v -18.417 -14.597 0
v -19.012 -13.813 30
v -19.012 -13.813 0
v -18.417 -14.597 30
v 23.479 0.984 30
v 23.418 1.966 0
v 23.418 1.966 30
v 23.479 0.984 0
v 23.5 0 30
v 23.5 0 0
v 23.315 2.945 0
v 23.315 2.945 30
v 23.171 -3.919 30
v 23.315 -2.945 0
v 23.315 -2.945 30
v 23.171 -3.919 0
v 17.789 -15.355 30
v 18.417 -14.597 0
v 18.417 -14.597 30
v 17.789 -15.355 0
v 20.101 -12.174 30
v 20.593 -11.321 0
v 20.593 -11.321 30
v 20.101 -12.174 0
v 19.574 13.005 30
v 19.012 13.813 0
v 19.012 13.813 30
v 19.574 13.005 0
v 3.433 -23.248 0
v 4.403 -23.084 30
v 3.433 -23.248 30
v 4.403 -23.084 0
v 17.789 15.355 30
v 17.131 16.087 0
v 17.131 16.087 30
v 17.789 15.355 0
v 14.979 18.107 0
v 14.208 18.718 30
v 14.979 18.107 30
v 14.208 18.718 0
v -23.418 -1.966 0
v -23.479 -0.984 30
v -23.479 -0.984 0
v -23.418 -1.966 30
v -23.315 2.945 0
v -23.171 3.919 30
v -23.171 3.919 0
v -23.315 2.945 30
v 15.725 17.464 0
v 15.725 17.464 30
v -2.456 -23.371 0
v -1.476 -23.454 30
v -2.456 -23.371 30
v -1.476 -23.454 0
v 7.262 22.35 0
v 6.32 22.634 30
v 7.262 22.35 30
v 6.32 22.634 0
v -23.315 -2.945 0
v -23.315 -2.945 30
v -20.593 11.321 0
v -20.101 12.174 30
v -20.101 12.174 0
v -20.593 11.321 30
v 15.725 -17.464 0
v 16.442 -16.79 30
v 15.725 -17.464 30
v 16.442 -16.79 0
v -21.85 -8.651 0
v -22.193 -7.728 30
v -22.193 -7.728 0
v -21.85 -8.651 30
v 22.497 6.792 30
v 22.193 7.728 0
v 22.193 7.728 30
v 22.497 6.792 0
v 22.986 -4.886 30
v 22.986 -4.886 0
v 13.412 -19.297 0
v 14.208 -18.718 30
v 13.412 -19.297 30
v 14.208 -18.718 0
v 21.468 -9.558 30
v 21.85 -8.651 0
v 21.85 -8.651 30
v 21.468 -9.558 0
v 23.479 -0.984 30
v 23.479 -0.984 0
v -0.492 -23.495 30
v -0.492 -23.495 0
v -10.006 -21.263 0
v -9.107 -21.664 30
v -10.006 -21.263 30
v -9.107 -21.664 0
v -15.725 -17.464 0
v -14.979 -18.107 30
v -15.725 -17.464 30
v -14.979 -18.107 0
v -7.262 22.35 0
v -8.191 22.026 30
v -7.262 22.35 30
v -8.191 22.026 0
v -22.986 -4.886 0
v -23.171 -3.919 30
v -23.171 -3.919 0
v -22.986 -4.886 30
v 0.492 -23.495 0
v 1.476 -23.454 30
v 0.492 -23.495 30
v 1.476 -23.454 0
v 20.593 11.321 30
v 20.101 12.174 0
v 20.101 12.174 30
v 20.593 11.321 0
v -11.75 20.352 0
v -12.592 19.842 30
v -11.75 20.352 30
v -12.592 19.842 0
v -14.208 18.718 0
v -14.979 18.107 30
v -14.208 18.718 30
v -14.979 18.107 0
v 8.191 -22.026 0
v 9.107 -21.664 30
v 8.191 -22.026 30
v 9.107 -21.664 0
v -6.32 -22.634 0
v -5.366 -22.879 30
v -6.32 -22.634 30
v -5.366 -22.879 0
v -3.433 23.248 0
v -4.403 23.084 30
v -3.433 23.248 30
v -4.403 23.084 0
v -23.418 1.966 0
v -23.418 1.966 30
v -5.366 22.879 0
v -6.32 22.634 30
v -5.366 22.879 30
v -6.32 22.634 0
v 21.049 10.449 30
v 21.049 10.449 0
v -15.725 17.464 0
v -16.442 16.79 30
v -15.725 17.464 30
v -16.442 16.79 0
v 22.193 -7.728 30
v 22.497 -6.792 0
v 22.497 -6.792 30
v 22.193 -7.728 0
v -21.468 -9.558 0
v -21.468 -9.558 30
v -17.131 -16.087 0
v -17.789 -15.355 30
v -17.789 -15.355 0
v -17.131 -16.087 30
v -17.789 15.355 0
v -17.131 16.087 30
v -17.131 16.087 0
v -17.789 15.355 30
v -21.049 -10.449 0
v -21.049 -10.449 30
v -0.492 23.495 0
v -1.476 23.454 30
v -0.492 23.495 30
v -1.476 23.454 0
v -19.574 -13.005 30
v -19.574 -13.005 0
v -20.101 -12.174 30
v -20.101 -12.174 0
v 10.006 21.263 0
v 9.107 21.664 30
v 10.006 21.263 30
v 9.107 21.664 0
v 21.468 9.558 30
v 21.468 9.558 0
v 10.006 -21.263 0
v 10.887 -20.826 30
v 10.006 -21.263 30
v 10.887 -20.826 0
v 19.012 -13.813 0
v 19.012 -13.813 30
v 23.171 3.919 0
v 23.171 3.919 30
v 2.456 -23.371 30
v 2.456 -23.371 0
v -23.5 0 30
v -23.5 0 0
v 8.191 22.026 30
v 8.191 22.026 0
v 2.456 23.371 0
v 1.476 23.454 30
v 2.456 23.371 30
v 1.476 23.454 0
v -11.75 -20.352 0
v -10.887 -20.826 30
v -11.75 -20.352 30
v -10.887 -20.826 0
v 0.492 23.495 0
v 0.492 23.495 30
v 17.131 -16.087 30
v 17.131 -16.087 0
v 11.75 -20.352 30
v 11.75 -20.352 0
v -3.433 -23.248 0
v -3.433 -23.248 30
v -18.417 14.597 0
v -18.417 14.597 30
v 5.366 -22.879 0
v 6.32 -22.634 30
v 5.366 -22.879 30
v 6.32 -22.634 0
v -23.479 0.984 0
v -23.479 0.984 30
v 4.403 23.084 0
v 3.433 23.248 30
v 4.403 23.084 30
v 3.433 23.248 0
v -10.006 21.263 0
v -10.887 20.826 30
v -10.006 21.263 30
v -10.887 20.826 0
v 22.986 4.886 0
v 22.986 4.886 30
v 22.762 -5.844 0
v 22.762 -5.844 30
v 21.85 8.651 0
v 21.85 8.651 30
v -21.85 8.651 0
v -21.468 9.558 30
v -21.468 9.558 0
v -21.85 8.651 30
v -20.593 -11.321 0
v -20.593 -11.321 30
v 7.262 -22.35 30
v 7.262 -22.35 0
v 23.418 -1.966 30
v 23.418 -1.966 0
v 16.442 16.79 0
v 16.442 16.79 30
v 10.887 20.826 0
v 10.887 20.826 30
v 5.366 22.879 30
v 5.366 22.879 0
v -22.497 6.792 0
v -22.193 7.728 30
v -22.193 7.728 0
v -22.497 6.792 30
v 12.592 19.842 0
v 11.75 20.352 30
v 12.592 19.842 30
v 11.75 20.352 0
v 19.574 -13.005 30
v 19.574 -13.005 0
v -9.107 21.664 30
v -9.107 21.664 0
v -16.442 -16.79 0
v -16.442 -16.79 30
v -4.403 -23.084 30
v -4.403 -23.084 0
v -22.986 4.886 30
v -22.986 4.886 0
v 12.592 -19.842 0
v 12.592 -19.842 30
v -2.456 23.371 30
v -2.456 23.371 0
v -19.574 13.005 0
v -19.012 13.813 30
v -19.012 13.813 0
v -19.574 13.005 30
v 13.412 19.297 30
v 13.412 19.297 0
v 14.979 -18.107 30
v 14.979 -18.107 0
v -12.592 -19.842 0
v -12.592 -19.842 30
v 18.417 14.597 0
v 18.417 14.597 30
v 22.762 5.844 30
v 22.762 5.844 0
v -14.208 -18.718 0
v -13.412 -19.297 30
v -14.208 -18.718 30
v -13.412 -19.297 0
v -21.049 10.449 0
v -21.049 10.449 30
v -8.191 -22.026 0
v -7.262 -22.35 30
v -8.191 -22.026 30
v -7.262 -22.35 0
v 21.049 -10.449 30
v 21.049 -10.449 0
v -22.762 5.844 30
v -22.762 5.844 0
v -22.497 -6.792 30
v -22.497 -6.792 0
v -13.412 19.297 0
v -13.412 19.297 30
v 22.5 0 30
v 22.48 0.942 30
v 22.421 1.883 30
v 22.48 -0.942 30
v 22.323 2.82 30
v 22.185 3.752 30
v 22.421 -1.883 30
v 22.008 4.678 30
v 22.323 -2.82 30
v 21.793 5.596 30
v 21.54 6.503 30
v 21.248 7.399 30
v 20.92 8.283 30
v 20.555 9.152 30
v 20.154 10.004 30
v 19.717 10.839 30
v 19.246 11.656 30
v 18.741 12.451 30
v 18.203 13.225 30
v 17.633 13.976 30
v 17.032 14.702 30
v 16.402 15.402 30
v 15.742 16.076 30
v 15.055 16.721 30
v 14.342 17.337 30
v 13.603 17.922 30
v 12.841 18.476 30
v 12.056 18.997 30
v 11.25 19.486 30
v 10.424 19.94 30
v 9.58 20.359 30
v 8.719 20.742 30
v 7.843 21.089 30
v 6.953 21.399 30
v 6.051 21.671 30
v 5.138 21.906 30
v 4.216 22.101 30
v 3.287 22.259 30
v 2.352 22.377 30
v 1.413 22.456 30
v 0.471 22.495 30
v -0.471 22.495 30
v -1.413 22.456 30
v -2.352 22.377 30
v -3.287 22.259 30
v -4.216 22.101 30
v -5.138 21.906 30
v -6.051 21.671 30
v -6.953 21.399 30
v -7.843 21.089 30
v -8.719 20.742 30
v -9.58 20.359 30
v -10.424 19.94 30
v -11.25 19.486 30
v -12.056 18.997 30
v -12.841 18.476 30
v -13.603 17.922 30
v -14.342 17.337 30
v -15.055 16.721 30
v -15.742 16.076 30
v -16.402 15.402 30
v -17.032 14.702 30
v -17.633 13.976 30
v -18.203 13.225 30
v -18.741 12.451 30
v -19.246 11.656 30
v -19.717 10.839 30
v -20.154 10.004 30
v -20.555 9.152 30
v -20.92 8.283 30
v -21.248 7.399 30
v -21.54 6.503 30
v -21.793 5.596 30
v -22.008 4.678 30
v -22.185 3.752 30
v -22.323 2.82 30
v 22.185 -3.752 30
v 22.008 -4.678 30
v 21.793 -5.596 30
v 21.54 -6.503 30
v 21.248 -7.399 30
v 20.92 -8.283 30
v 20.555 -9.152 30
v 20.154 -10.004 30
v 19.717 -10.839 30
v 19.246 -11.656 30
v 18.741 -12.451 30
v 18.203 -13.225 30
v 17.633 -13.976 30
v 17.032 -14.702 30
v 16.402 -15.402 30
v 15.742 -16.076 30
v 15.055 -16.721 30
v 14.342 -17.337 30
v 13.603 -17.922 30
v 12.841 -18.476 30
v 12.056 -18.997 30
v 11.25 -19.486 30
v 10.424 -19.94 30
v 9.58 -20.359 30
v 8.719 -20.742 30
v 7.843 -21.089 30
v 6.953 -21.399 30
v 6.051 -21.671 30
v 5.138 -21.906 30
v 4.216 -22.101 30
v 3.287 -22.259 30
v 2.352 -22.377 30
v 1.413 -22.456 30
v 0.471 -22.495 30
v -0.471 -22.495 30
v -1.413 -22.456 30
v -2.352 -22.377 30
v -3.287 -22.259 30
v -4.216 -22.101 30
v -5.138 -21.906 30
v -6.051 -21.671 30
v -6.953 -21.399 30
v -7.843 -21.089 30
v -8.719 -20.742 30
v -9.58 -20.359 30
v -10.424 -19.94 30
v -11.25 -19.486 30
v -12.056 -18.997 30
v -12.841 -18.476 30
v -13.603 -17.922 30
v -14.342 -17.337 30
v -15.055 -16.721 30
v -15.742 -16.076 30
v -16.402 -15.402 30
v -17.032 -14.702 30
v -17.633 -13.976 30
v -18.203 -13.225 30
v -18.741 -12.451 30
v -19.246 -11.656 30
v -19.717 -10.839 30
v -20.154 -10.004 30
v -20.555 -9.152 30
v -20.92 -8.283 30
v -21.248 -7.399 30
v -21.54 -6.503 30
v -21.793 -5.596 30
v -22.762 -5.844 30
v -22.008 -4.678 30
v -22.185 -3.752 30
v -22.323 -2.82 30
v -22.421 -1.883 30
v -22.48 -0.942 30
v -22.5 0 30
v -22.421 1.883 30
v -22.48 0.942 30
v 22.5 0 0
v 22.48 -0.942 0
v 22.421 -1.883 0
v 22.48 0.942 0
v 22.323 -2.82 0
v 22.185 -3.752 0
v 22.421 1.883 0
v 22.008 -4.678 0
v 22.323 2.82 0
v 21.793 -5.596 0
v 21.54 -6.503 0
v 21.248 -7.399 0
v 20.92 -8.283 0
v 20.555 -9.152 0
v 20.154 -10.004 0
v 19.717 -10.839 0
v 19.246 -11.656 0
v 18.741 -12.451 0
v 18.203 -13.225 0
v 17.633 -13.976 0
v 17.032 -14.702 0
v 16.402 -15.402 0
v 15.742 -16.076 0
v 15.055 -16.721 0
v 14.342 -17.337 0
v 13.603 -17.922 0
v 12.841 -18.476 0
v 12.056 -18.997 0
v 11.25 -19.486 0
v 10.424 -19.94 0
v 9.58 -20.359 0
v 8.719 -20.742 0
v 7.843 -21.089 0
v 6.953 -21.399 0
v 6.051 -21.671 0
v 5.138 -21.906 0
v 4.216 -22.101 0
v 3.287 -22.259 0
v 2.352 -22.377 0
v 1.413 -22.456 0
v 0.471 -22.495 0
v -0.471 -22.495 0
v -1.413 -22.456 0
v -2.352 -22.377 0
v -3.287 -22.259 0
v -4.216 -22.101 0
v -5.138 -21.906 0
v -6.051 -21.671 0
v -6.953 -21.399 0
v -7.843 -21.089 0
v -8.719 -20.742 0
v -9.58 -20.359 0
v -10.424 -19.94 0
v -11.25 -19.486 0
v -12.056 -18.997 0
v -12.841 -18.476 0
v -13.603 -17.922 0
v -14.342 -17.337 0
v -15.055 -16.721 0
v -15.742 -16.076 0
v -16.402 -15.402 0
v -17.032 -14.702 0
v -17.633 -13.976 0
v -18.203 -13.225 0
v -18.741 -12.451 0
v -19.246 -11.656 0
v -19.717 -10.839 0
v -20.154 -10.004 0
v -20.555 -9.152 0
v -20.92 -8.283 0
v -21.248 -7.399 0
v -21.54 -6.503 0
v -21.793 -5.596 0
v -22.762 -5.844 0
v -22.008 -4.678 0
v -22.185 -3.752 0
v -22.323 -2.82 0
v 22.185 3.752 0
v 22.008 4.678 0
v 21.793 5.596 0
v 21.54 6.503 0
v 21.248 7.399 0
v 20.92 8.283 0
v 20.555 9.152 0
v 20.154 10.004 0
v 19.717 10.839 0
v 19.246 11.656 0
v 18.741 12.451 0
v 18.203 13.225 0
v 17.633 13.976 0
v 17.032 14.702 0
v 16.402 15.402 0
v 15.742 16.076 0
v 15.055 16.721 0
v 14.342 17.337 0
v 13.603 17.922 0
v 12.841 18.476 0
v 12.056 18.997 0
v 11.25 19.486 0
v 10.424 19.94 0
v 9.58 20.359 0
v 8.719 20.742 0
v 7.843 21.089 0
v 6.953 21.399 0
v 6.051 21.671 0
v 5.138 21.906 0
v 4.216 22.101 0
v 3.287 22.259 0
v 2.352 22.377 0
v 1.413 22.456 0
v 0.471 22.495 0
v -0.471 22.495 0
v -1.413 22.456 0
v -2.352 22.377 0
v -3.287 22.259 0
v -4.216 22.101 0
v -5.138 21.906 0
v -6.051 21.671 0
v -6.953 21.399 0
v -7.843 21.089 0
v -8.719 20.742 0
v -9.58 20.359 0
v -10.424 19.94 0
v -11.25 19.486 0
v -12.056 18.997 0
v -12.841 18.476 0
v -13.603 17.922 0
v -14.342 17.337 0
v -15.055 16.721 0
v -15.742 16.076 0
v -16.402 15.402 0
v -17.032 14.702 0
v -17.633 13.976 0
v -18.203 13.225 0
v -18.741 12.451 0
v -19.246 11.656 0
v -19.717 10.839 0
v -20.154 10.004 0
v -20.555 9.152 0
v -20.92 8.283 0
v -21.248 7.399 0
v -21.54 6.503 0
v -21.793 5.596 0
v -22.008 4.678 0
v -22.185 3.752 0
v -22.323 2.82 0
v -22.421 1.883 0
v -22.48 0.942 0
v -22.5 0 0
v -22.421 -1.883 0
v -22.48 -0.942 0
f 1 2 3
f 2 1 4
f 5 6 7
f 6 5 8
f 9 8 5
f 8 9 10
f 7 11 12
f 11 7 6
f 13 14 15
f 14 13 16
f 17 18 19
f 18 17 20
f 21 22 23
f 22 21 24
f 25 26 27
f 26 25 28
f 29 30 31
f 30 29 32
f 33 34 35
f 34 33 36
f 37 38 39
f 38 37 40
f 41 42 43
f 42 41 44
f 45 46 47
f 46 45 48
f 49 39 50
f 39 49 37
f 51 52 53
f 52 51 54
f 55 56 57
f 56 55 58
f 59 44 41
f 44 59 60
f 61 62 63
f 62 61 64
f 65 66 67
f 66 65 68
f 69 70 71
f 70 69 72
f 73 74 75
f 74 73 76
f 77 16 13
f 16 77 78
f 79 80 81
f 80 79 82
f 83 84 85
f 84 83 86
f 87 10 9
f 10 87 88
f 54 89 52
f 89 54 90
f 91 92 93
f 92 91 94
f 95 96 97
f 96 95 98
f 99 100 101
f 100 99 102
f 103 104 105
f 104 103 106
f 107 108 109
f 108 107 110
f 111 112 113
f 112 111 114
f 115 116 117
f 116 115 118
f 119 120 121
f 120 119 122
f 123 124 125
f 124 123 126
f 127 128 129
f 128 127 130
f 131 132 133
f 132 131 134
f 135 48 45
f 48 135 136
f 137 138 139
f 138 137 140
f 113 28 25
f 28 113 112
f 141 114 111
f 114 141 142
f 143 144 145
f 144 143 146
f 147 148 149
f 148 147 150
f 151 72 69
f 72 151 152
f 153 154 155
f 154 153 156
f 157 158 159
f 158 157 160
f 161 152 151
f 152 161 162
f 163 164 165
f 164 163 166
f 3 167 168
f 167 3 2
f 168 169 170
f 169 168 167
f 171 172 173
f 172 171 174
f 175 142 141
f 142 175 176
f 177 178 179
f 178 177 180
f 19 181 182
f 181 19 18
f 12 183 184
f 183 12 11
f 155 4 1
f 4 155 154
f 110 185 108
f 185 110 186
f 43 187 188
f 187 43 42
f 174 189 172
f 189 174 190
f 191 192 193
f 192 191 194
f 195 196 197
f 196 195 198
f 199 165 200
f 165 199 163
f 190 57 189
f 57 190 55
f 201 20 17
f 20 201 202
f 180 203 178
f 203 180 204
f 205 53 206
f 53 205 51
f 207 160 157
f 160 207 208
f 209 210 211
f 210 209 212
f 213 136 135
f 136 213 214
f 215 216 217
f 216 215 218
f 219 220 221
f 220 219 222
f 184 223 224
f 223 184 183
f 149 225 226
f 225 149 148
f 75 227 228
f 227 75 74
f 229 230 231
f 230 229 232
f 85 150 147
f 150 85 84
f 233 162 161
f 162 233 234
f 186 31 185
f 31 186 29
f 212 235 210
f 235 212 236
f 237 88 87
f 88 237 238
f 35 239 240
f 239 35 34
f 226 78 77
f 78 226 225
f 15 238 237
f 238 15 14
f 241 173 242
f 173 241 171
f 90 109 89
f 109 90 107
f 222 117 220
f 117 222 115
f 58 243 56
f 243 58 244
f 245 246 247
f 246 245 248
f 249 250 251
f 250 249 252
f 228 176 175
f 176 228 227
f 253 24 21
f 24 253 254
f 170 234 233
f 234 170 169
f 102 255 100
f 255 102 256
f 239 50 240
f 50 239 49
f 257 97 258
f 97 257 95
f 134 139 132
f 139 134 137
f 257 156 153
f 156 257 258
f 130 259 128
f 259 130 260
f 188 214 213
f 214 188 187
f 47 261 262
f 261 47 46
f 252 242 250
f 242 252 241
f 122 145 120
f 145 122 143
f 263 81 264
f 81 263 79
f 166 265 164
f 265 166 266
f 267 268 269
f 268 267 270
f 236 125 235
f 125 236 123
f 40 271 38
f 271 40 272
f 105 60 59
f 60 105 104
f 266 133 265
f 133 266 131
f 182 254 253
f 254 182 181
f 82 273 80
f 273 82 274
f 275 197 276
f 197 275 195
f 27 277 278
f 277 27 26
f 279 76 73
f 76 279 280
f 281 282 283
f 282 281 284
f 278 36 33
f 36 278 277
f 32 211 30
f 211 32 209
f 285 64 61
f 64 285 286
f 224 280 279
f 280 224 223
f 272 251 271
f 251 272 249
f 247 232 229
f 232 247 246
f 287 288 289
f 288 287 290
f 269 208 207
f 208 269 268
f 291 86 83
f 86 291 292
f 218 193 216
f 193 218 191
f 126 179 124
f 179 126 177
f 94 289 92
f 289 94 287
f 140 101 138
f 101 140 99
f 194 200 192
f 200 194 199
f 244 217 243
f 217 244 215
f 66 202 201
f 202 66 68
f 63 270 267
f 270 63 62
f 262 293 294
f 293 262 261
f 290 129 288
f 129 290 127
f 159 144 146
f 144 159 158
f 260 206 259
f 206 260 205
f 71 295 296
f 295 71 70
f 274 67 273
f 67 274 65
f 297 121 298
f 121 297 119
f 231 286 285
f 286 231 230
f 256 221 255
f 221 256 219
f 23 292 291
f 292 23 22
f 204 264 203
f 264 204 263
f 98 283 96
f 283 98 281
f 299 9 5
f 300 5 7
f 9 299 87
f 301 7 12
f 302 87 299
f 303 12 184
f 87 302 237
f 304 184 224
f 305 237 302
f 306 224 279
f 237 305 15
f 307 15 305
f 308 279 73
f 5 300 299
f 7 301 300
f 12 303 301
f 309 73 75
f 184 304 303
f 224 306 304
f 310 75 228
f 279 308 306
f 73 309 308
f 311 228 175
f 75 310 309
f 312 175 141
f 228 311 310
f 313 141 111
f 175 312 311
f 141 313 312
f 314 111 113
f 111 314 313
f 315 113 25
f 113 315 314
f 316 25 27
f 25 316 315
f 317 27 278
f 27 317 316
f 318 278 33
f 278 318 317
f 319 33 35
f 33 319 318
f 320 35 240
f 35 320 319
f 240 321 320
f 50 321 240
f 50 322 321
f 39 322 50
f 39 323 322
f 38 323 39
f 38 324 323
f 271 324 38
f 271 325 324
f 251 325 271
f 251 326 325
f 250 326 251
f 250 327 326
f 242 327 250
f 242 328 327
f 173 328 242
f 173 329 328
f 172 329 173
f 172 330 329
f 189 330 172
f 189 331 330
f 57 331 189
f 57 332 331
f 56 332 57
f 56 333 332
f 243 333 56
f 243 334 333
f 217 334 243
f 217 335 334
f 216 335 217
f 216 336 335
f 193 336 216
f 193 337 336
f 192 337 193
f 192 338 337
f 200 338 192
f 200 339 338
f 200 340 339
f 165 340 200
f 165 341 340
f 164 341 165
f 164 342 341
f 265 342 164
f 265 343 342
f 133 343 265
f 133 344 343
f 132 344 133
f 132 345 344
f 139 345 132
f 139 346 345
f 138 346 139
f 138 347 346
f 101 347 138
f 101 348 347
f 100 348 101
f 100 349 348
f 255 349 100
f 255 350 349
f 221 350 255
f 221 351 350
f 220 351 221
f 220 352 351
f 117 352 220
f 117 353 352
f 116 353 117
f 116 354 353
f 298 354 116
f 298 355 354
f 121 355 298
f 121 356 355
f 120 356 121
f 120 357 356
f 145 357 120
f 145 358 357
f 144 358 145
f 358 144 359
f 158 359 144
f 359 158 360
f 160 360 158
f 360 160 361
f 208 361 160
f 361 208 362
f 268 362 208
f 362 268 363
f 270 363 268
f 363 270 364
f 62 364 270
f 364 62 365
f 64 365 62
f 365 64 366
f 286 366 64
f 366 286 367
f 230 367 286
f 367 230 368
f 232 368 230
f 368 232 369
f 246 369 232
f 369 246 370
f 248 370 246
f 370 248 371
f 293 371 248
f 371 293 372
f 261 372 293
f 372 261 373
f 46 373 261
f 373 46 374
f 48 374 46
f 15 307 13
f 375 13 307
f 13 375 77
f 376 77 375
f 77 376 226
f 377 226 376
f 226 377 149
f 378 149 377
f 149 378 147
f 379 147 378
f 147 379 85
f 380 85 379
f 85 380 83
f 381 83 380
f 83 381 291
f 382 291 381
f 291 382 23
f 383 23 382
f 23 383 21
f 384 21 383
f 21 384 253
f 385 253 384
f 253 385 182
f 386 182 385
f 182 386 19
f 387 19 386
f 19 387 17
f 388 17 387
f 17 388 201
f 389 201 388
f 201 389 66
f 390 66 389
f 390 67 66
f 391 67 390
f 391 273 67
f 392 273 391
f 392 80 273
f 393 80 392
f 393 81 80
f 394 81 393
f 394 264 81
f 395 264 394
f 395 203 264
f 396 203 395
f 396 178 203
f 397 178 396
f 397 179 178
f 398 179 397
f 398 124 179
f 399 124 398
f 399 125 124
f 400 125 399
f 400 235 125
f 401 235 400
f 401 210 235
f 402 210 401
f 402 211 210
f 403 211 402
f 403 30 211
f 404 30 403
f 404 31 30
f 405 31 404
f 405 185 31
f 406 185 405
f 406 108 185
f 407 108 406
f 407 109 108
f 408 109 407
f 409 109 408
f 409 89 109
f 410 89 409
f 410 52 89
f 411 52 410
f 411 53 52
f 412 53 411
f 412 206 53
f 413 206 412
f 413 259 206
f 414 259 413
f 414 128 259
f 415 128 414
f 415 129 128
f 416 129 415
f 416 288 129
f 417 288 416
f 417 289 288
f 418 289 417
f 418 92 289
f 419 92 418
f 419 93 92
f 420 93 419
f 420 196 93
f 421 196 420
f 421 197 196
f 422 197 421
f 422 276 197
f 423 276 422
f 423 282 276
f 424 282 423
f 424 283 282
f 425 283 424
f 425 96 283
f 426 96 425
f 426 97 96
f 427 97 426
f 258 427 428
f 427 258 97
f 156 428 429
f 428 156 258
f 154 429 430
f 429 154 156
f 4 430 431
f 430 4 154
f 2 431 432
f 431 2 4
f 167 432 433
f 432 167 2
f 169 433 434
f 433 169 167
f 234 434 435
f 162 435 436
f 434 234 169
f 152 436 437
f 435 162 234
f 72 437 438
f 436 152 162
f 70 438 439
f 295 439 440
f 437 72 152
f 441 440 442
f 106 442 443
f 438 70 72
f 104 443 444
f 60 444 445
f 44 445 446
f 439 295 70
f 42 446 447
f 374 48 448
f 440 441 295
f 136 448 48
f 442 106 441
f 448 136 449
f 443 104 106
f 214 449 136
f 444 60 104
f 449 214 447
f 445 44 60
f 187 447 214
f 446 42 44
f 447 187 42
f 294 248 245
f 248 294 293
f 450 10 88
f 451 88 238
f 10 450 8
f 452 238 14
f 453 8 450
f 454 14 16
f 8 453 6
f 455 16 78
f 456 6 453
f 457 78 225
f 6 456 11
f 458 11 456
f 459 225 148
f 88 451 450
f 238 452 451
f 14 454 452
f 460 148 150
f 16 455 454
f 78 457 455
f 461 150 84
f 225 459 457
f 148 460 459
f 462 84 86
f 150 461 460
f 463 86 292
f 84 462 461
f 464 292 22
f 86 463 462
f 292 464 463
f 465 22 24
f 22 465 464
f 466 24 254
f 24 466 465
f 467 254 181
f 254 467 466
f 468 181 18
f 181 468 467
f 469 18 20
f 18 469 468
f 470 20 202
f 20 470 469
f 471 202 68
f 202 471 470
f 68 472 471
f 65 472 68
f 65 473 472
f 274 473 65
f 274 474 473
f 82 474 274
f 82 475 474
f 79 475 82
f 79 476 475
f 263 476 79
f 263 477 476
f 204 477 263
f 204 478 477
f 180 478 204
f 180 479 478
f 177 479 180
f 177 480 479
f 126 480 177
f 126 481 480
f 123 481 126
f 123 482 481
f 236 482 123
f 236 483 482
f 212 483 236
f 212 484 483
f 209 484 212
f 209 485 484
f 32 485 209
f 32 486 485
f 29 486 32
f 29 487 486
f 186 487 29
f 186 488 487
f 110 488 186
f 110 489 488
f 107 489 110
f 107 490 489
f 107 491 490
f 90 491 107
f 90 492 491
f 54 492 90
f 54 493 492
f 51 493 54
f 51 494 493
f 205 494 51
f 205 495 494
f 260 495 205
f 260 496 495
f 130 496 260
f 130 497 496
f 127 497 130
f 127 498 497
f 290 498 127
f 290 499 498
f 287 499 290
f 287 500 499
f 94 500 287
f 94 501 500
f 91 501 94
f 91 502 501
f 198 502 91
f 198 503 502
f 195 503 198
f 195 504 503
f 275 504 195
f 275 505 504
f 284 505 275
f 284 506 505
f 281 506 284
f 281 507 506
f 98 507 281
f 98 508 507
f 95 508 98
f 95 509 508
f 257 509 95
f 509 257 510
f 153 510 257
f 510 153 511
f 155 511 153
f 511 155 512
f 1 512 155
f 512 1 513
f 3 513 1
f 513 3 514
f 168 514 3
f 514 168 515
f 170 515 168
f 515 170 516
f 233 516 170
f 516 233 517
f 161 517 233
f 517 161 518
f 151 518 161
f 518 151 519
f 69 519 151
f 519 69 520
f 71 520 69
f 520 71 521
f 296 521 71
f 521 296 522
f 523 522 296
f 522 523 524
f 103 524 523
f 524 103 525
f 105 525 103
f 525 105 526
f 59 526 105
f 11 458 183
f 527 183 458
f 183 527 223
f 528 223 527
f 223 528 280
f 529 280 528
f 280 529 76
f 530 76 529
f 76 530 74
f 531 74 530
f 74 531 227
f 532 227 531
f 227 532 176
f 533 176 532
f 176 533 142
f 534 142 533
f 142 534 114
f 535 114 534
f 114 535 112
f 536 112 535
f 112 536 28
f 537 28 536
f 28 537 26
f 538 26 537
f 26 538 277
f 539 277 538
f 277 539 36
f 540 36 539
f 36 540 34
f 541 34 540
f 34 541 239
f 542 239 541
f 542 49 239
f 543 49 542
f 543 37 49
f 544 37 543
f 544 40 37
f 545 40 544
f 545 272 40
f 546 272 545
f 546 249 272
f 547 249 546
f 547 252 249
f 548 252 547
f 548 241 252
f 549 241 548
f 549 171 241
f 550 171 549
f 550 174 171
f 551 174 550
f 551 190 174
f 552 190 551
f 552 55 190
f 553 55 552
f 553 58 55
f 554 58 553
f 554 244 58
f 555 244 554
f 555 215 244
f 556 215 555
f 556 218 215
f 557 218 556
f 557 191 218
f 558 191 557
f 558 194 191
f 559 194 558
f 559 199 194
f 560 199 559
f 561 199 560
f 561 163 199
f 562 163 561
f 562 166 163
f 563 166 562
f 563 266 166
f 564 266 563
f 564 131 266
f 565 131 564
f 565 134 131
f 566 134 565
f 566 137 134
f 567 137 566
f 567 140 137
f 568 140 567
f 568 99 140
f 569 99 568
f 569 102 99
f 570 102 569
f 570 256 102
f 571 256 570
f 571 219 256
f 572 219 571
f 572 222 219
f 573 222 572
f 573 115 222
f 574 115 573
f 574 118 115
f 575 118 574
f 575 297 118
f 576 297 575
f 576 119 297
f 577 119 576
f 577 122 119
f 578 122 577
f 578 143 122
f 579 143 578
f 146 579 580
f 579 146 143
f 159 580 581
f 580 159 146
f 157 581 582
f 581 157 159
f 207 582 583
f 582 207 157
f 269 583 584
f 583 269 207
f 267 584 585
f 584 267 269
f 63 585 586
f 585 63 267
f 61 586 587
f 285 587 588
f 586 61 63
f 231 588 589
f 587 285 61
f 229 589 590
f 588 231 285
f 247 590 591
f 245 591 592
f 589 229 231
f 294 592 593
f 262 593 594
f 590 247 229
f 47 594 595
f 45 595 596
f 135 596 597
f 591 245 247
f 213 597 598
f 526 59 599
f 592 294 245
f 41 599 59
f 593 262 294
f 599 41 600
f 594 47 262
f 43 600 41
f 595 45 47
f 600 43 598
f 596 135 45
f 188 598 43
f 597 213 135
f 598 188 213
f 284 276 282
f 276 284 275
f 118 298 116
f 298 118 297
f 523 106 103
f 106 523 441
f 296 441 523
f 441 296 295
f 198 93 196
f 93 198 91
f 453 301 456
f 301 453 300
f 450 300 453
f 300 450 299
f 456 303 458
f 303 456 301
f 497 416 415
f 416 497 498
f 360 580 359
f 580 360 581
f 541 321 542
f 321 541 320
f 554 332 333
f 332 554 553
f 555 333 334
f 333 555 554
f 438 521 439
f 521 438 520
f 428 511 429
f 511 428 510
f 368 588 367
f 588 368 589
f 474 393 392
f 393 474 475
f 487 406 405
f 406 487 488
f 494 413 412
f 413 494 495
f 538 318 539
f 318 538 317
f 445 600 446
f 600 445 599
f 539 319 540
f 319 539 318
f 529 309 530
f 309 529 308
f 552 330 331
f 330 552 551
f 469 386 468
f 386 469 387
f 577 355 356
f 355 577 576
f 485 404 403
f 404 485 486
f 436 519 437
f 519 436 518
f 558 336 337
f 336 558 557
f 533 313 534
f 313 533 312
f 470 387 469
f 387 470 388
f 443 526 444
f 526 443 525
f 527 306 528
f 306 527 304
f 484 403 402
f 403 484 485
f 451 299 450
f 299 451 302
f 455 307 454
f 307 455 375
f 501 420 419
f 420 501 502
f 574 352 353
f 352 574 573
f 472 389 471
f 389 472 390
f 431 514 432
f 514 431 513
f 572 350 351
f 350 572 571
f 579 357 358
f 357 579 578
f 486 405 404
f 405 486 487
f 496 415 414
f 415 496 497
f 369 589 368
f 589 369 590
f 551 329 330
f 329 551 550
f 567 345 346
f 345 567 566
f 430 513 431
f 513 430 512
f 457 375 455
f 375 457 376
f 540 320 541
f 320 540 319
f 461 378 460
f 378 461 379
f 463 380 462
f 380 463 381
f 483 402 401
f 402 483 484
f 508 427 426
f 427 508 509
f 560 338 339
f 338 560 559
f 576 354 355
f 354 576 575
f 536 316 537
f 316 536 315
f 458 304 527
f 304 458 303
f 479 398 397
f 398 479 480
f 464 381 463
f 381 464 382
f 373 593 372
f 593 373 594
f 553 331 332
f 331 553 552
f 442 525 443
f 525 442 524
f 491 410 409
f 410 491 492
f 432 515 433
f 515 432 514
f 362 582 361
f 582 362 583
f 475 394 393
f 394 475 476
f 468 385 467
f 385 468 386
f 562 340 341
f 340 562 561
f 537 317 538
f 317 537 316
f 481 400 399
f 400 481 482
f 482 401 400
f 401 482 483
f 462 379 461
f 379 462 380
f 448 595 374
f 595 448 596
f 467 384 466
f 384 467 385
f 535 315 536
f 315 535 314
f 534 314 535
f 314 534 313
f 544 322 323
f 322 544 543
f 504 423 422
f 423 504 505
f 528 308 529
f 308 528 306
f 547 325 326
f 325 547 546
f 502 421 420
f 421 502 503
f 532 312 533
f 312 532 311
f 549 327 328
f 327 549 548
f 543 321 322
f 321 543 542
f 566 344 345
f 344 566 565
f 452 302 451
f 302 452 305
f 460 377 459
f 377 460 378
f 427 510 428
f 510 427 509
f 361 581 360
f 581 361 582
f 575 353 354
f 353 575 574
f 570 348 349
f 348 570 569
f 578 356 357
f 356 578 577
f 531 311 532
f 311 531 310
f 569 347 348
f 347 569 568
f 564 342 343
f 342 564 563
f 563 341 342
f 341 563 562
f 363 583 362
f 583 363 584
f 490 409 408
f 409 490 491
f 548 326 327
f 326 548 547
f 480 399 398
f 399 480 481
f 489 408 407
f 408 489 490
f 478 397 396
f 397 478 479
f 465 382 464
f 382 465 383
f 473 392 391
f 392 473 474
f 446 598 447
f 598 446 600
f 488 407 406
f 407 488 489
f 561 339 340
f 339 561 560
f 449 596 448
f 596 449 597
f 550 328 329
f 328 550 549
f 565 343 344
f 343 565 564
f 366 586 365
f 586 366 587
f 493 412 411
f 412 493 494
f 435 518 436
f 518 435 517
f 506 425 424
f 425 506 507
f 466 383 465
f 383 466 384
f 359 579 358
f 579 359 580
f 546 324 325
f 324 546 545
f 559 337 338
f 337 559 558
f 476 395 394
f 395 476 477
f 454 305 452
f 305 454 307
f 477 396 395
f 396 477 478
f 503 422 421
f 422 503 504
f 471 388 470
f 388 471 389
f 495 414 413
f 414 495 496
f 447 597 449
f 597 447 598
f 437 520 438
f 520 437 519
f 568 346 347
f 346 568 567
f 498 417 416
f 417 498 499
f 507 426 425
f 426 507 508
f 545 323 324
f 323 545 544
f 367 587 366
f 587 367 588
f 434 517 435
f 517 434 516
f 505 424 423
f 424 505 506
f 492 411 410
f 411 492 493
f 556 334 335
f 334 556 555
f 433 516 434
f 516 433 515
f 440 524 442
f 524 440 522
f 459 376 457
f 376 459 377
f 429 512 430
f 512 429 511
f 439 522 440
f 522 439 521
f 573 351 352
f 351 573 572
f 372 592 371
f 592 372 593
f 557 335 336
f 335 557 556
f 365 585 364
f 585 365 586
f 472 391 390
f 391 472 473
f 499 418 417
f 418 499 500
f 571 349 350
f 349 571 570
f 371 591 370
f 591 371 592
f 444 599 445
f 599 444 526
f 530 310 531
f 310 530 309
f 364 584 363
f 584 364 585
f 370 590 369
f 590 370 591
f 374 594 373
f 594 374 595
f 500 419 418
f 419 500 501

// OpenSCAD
$fn = 150;

difference() {
	cylinder(d = 47.0, h = 30.0);
	translate(v = [0, 0, -2.5]) {
		cylinder(d = 45.0, h = 35.0);
	}
}
